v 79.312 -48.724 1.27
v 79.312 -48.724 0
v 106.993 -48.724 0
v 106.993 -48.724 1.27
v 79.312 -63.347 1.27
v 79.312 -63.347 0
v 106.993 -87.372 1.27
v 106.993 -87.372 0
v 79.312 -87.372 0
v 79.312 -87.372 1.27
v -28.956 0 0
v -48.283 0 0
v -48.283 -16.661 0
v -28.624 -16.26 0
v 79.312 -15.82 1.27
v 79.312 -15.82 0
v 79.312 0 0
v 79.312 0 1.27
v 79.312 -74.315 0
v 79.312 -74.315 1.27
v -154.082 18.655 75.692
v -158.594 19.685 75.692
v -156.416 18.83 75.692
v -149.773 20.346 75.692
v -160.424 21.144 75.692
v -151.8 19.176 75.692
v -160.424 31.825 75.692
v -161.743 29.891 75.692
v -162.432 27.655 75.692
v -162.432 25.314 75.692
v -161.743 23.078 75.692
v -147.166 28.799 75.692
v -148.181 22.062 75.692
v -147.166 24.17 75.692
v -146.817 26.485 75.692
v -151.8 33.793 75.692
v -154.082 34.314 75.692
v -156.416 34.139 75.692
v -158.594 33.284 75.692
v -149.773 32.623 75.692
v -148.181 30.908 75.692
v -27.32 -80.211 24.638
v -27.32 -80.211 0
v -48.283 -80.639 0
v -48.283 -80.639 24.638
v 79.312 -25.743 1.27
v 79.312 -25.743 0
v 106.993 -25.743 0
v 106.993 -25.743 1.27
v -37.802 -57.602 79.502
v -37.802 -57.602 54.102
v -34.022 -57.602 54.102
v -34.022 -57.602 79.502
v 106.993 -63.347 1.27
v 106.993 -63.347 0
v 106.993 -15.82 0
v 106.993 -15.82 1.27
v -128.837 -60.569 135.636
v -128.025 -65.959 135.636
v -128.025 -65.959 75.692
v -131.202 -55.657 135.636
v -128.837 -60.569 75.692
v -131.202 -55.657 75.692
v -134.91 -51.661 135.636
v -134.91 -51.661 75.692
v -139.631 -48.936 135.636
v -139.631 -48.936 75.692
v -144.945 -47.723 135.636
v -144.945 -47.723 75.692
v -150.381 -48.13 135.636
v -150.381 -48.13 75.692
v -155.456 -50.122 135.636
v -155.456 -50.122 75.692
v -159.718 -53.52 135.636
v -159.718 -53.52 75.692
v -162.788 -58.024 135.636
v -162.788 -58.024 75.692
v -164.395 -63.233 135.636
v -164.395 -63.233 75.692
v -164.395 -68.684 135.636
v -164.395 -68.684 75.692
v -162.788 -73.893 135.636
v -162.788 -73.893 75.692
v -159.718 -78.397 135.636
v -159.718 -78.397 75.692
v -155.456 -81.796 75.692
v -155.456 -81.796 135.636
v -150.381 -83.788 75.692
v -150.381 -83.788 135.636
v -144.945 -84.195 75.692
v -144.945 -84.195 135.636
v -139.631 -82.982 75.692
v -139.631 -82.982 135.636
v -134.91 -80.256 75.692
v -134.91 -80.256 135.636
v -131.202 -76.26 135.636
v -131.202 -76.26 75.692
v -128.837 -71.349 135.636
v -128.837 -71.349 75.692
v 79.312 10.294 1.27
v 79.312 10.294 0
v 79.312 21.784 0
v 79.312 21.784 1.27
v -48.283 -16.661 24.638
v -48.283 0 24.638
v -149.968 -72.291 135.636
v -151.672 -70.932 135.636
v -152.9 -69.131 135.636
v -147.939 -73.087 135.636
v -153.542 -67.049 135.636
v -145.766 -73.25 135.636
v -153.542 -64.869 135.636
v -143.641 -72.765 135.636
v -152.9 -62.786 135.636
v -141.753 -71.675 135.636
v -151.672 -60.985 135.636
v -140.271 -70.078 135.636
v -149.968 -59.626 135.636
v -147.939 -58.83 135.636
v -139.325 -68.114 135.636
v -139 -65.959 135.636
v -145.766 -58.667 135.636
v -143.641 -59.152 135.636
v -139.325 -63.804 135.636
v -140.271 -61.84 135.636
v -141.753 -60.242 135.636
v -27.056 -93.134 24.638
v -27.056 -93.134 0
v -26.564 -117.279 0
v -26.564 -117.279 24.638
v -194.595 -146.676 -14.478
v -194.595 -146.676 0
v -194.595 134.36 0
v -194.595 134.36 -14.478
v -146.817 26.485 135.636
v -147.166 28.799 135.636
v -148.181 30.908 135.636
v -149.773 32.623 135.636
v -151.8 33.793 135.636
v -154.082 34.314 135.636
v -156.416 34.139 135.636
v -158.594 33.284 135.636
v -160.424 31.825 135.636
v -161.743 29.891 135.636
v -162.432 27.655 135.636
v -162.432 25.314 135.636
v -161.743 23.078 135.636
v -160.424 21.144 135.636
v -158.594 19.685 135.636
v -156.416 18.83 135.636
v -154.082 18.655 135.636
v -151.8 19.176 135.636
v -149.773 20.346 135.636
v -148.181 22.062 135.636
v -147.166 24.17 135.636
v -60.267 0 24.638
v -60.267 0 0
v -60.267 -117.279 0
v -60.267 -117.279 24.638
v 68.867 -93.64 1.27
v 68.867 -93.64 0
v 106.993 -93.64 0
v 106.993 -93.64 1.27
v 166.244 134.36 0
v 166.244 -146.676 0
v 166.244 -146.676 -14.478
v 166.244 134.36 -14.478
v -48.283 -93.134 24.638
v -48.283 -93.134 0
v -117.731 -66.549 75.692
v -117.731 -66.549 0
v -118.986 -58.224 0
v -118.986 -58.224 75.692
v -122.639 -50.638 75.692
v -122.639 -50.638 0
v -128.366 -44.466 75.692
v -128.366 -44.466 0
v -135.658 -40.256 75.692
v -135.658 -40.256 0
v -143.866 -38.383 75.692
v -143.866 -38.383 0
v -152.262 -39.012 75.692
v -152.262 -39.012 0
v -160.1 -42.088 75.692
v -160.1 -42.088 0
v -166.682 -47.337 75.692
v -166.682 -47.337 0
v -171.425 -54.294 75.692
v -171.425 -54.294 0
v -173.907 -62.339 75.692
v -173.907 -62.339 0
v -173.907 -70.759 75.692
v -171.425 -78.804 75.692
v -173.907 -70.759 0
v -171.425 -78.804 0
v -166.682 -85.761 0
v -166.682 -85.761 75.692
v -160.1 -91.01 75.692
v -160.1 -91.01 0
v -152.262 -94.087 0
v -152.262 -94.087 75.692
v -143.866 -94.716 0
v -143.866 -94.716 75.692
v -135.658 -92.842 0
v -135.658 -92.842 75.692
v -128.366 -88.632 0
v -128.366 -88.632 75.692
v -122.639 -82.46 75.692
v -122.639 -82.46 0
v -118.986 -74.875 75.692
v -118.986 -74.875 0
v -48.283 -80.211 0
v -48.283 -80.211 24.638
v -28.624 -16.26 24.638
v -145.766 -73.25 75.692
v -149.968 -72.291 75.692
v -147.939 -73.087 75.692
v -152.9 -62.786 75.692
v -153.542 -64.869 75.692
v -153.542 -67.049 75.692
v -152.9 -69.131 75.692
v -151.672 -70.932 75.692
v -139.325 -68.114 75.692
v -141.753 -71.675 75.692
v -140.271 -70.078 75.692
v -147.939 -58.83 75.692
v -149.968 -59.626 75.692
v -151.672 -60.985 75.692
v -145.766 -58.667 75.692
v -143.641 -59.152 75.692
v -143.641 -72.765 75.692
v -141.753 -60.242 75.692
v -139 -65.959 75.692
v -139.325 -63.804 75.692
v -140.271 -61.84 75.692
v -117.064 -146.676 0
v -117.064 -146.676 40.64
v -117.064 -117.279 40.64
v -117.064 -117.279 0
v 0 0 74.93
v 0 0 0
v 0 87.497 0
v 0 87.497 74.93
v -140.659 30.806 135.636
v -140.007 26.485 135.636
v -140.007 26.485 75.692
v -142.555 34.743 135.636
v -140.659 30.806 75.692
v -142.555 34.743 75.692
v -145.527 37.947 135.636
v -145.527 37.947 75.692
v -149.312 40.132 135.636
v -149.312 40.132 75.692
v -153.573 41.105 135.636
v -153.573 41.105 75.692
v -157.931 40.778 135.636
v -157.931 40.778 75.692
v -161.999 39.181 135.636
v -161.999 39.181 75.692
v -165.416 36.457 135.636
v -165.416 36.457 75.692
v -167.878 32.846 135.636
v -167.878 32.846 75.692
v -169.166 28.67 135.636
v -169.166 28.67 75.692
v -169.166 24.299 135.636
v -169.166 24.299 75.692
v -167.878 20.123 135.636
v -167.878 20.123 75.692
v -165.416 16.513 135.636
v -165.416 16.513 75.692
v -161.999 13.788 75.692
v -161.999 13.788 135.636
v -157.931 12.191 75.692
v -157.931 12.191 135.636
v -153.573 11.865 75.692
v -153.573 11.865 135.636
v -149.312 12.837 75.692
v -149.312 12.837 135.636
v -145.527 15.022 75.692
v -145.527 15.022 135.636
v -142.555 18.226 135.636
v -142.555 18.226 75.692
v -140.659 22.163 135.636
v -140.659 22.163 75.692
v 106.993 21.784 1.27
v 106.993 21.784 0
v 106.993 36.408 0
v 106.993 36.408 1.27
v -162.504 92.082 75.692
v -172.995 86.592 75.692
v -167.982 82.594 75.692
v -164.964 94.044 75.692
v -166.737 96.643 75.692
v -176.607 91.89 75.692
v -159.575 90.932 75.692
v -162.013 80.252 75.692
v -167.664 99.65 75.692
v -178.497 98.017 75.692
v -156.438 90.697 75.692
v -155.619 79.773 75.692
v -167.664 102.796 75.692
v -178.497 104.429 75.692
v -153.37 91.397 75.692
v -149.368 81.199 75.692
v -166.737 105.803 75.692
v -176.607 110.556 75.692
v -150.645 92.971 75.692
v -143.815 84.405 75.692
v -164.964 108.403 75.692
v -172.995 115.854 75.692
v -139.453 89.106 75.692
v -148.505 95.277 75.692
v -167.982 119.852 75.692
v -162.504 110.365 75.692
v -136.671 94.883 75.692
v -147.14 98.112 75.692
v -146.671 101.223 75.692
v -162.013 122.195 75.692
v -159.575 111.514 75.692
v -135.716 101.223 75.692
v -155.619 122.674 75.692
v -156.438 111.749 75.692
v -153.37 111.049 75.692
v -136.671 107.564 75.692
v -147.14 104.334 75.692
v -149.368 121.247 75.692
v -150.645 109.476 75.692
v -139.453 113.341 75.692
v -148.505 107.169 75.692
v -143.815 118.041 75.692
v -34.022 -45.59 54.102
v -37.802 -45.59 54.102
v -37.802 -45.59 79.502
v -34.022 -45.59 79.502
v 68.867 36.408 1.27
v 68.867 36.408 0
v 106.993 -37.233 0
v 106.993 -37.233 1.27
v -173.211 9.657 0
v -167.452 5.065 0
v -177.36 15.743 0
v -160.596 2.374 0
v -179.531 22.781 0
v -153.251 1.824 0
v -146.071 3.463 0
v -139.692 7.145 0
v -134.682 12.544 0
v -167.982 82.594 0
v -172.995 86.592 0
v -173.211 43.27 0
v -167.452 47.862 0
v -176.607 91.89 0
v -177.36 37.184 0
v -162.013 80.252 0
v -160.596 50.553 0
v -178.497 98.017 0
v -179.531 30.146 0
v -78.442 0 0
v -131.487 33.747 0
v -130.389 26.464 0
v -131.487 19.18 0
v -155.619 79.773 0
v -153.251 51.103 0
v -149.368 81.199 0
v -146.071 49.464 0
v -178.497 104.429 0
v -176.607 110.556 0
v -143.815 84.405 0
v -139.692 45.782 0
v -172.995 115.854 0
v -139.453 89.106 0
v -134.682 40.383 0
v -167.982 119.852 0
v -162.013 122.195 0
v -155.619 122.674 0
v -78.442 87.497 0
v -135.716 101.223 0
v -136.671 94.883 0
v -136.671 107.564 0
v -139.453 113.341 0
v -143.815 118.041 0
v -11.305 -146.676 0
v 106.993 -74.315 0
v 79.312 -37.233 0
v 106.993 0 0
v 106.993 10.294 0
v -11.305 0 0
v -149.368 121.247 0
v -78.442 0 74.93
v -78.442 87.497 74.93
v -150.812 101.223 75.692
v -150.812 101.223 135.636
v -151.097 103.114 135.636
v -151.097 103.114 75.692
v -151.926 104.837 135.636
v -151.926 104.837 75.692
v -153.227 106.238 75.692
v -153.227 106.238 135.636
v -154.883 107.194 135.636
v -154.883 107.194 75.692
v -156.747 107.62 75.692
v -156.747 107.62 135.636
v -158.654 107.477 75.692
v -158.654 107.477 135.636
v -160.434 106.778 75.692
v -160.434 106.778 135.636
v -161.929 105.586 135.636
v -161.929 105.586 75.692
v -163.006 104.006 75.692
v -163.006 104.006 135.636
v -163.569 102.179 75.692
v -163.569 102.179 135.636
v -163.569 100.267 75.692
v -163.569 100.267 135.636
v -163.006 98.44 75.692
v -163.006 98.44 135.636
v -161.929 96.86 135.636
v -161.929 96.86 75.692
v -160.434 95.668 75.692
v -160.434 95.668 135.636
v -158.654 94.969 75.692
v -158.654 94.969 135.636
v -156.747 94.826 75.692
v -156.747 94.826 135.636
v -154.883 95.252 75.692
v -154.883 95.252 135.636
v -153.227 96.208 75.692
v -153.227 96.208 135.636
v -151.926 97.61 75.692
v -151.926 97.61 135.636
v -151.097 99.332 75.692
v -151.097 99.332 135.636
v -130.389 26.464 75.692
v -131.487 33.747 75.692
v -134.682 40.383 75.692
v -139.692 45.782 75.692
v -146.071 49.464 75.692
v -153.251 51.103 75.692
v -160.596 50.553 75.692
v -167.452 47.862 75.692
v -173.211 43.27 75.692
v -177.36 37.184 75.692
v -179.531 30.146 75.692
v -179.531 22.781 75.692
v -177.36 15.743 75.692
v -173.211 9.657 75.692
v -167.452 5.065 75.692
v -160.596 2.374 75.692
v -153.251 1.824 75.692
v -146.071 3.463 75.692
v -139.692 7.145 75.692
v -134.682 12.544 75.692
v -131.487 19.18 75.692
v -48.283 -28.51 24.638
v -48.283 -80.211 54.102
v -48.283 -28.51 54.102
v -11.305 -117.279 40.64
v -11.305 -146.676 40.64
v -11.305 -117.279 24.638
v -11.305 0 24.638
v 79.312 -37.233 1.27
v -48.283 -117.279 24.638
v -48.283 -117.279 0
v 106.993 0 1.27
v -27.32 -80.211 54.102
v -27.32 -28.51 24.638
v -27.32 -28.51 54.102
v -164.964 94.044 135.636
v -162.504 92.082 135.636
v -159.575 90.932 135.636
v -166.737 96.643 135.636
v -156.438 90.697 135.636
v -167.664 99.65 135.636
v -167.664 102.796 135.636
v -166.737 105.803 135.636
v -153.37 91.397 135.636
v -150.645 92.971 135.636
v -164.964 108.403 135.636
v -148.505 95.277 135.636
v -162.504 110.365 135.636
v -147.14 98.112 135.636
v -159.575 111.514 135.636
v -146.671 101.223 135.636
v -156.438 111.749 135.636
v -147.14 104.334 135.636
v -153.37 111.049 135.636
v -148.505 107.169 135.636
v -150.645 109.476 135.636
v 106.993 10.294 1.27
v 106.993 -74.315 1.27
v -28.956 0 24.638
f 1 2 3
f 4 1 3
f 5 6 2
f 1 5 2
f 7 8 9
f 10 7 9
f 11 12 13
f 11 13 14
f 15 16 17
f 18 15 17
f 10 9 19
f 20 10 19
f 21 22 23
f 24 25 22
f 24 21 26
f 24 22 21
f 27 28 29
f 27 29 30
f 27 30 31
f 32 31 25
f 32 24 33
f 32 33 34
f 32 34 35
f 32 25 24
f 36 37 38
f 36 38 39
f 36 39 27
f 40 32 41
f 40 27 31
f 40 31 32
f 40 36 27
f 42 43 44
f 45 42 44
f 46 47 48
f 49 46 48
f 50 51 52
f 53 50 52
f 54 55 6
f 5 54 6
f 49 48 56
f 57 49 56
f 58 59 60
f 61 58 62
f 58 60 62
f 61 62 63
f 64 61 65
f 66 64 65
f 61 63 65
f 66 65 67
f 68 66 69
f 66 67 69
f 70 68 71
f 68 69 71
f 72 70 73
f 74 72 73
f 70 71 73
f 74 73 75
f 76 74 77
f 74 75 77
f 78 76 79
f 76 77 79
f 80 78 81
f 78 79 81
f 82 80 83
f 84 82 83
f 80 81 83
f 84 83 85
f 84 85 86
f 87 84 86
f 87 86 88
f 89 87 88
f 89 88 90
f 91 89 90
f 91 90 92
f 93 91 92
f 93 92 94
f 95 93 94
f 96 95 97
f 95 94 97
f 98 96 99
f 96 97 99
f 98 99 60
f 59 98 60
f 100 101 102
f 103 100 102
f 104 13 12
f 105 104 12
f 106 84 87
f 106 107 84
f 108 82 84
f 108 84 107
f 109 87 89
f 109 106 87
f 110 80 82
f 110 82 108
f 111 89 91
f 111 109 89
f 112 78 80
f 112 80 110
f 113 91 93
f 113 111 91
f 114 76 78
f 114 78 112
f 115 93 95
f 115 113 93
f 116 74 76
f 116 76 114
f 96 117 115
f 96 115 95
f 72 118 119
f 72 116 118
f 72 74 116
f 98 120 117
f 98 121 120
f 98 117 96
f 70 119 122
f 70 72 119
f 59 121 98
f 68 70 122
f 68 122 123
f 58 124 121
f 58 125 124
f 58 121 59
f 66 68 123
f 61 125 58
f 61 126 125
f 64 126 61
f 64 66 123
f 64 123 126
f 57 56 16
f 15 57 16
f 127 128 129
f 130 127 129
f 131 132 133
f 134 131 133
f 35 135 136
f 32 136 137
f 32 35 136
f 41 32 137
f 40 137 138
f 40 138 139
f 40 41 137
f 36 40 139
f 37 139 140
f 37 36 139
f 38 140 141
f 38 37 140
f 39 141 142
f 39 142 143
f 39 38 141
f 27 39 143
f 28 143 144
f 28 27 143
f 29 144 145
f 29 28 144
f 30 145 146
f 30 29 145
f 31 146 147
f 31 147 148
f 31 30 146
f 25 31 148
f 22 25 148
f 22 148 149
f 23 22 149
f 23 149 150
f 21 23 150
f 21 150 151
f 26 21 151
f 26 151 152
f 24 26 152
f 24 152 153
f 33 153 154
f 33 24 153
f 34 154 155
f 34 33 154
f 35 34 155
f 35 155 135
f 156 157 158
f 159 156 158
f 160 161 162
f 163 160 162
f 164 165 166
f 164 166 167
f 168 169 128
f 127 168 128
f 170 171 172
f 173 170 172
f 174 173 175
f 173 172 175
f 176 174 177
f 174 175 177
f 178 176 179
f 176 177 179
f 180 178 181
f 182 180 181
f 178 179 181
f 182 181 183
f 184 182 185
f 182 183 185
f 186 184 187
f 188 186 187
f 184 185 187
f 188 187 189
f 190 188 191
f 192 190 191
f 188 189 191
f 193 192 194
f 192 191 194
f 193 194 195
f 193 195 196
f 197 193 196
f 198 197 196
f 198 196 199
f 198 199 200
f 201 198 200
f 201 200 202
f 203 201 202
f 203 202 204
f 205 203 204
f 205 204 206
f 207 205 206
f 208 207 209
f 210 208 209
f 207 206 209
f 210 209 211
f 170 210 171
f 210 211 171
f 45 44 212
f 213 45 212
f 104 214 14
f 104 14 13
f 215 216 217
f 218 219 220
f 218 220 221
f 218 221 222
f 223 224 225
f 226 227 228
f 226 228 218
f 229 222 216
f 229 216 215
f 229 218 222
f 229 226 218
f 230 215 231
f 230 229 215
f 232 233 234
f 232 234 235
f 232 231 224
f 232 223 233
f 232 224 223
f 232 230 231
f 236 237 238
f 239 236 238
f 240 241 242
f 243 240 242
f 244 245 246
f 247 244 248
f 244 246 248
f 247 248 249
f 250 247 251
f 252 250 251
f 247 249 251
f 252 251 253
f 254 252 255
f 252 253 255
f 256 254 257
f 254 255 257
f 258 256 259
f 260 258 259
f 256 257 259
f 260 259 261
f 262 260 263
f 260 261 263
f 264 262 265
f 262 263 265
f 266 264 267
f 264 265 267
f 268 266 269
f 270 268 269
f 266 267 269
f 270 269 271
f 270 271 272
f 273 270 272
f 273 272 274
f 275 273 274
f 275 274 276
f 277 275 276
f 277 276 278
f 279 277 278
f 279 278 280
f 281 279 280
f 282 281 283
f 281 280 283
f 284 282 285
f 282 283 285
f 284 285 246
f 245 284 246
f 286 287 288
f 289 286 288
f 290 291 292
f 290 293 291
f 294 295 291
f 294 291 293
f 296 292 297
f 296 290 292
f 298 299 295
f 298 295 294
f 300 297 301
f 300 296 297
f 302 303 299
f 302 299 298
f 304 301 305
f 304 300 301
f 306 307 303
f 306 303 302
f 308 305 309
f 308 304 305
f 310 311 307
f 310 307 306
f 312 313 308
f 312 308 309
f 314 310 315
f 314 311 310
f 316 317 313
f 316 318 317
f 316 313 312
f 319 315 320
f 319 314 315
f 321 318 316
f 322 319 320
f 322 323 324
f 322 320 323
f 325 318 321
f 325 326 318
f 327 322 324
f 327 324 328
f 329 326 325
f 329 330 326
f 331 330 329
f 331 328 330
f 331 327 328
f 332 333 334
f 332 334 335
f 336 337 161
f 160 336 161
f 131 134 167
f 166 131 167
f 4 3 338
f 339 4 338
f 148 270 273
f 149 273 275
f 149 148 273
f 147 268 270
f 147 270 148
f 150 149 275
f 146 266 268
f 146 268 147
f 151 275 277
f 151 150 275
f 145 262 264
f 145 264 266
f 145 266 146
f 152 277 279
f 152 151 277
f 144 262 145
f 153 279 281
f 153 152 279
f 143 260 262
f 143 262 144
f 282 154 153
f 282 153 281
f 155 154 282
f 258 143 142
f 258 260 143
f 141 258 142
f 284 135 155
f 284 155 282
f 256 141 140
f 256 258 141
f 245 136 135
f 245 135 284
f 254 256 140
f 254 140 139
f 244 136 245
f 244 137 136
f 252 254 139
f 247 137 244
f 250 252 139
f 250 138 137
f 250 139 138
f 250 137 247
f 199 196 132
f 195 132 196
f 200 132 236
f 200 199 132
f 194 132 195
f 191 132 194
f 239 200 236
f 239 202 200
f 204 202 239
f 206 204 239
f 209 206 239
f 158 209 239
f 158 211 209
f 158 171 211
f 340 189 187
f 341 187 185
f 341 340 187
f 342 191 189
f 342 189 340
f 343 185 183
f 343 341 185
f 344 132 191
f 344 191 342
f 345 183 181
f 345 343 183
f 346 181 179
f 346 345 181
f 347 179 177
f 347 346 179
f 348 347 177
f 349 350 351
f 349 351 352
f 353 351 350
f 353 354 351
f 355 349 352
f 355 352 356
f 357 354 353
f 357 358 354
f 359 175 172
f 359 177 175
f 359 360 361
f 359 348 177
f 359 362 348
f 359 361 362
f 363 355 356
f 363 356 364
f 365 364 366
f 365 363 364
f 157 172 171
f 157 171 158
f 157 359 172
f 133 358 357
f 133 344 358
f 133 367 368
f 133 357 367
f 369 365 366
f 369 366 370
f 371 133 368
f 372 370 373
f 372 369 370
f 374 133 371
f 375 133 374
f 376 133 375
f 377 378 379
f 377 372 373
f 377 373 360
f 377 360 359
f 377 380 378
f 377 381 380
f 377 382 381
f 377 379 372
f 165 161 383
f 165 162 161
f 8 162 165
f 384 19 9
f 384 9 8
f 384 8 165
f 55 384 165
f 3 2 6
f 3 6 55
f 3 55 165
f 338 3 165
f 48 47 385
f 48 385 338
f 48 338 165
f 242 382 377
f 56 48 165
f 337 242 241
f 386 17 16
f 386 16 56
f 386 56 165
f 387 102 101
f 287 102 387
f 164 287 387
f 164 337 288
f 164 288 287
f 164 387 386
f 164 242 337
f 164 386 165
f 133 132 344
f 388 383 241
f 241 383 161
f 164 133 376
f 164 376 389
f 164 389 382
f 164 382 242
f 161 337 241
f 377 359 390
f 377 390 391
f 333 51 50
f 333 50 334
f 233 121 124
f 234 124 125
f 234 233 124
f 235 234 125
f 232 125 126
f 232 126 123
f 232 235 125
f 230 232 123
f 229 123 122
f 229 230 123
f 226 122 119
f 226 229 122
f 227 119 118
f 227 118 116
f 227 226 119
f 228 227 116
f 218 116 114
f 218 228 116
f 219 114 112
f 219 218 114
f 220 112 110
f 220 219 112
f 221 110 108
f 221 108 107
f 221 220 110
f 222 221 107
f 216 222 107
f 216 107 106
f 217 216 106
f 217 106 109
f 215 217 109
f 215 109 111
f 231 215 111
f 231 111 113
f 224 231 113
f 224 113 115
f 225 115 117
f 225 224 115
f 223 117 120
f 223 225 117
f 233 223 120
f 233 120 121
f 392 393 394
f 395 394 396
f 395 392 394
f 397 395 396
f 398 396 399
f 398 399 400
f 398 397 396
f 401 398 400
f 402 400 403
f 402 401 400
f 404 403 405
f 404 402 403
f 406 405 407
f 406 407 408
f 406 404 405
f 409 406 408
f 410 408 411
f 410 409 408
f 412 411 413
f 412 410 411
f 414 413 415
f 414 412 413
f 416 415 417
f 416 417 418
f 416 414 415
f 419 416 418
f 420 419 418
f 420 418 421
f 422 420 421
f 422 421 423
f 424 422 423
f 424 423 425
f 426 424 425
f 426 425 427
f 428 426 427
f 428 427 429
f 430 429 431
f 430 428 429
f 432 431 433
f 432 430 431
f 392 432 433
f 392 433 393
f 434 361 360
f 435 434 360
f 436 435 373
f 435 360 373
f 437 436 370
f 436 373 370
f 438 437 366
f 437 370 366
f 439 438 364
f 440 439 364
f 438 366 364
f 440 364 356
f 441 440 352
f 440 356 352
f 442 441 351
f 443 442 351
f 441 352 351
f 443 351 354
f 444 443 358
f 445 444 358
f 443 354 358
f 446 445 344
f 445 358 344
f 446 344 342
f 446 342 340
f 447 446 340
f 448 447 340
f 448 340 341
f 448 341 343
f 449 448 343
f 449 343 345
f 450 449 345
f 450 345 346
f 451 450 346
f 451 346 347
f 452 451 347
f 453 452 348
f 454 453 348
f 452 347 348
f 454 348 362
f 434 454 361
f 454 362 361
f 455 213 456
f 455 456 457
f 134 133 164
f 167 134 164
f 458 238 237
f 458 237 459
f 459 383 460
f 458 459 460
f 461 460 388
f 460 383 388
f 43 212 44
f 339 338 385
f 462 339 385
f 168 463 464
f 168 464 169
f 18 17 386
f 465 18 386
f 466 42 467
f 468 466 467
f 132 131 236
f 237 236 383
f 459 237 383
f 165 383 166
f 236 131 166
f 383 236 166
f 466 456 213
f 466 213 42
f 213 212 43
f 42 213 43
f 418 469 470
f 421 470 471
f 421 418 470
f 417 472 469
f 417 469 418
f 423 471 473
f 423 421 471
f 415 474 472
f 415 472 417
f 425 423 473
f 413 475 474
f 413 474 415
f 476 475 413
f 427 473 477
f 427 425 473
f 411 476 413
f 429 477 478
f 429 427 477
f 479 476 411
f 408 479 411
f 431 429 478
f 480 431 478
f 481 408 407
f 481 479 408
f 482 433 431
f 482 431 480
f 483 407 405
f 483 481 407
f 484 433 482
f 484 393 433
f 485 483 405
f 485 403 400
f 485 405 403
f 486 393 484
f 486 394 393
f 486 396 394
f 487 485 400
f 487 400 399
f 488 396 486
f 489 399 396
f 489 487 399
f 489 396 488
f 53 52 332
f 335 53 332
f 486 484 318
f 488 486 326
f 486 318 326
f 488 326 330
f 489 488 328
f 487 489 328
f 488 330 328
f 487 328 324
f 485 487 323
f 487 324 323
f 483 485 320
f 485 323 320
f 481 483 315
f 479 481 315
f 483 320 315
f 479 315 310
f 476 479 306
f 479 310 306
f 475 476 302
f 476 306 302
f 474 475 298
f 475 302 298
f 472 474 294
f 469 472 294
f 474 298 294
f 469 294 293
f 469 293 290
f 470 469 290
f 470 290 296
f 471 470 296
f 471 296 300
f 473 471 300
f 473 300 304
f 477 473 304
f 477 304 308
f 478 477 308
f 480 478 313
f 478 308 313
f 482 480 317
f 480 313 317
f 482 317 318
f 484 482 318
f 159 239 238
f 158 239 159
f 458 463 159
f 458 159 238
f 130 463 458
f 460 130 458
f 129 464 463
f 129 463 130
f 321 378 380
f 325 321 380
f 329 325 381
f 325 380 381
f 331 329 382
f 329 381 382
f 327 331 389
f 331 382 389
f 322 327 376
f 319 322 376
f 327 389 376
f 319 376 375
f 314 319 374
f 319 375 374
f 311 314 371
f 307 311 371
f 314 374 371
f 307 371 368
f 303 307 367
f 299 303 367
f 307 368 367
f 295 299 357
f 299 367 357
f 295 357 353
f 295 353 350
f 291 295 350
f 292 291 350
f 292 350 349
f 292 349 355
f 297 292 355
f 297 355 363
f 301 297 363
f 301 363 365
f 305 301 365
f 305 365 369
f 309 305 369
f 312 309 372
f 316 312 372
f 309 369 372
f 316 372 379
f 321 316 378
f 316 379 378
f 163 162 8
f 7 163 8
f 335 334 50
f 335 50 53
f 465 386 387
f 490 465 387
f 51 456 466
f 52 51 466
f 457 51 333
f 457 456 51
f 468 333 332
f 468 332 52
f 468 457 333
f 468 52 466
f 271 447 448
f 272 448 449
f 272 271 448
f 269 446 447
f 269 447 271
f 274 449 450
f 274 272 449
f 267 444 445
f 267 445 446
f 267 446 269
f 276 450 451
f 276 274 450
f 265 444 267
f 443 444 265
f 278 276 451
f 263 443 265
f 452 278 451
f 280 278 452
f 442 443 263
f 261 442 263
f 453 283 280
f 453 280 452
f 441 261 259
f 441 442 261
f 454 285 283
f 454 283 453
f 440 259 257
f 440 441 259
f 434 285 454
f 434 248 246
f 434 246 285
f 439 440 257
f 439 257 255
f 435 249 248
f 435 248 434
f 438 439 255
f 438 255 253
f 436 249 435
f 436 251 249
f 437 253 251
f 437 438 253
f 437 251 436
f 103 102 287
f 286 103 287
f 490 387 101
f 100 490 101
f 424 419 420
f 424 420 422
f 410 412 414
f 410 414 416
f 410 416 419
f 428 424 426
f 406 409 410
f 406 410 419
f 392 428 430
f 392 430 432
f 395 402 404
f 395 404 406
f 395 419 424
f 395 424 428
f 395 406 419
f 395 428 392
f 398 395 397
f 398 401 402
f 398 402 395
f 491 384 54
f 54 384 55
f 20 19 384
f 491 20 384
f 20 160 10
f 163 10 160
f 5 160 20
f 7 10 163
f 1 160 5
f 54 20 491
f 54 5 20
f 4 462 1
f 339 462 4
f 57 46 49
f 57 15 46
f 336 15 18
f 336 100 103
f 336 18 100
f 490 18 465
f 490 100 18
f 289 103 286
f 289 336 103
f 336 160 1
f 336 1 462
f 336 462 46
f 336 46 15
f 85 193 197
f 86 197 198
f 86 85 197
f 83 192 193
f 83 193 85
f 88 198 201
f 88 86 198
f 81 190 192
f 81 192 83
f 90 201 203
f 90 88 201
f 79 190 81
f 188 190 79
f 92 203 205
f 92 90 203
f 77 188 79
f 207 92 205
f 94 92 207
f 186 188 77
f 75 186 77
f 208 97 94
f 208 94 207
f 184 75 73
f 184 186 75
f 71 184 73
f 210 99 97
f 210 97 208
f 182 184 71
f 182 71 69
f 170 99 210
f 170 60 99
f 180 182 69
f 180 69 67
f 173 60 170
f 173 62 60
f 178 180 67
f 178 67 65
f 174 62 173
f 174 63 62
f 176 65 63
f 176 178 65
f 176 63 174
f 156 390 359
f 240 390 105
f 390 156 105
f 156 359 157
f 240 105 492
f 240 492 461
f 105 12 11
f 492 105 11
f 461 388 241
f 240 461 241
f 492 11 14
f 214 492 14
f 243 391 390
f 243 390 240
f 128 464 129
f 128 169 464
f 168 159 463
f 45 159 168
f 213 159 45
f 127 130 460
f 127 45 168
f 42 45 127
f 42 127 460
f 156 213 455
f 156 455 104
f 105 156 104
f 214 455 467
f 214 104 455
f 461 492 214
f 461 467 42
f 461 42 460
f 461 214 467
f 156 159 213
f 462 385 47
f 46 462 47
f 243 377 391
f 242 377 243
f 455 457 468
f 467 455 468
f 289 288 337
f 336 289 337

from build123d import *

# Parameters (mm, degrees)
F0_W      = 360.8396798372
F0_H      = 281.035810709
F1_DEPTH  = 14.478
F2_R      = 21.5107094722
F2_R_2    = 24.7089721203
F2_R_3    = 28.2455541112
F3_DEPTH  = 75.692
F4_R      = 10.5555341184
F4_R_2    = 6.4147085914
F4_R_3    = 14.6610687467
F4_R_4    = 7.8515753599
F4_R_5    = 18.2872208754
F4_R_6    = 7.3119029403
F5_DEPTH  = 59.944
F6_W      = 78.4418359399
F6_H      = 87.4972045422
F7_DEPTH  = 74.93
F9_DEPTH  = 24.638
F10_W     = 20.9634182729
F10_H     = 51.7013933032
F11_DEPTH = 54.102
F12_W     = 3.7795142394
F12_H     = 12.0124146342
F13_DEPTH = 25.4
F14_W     = 105.7597789913
F14_H     = 29.3969660997
F15_DEPTH = 40.64
F17_DEPTH = 1.27


with BuildPart() as f1:
    # F0 (on Top) → F1 (new body)
    with BuildSketch(Plane.XY):
        with Locations((-14.175452292, -6.1578452587)):
            Rectangle(F0_W, F0_H)
    extrude(amount=-F1_DEPTH)

    # F2 (on face) → F3 (join)
    with BuildSketch(Plane.XY):
        with Locations((-157.2264283895, 101.2231707573)):
            Circle(F2_R)
        with Locations((-155.097797513, 26.4635402709)):
            Circle(F2_R_2)
        with Locations((-145.9769010544, -66.5491223335)):
            Circle(F2_R_3)
    extrude(amount=F3_DEPTH)

    # F4 (on face) → F5 (join)
    with BuildSketch(Plane.XY.offset(75.692)):
        with Locations((-157.2264283895, 101.2231707573)):
            Circle(F4_R)
        with Locations((-157.2264283895, 101.2231707573)):
            Circle(F4_R_2, mode=Mode.SUBTRACT)
        with Locations((-154.6684801579, 26.4845881611)):
            Circle(F4_R_3)
        with Locations((-154.6684801579, 26.4845881611)):
            Circle(F4_R_4, mode=Mode.SUBTRACT)
        with Locations((-146.3120281696, -65.9587830305)):
            Circle(F4_R_5)
        with Locations((-146.3120281696, -65.9587830305)):
            Circle(F4_R_6, mode=Mode.SUBTRACT)
    extrude(amount=F5_DEPTH)

    # F6 (on face) → F7 (join)
    with BuildSketch(Plane.XY):
        with Locations((-39.2209179699, 43.7486022711)):
            Rectangle(F6_W, F6_H)
    extrude(amount=F7_DEPTH)

    # F8 (on face) → F9 (join)
    with BuildSketch(Plane.XY):
        Polygon((-48.2832752168, 0), (-60.267470777, 0), (-60.267470777, -66.7334496975), (-60.267470777, -117.2787845135), (-48.2832752168, -117.2787845135), (-48.2832752168, -93.1336581707), (-48.2832752168, -80.6389690893), (-48.2832752168, -58.6393922567), (-48.2832752168, -43.9444051084), (-48.2832752168, -28.5100445064), (-48.2832752168, -16.6609026492), align=None)
        Polygon((-28.6240933259, -16.2599701732), (-48.2832752168, -16.6609026492), (-48.2832752168, -28.5100445064), (-28.3742633655, -28.5100445064), align=None)
        Polygon((-27.3198569439, -16.2333713694), (-28.6240933259, -16.2599701732), (-28.3742633655, -28.5100445064), align=None)
        Polygon((-28.9557017386, 0), (-28.6240933259, -16.2599701732), (-27.3198569439, -16.2333713694), (-28.3742633655, -28.5100445064), (-28.0799994067, -42.9388798786), (-27.3198569439, -58.211860977), (-27.7683332748, -58.2210072744), (-27.3198569439, -80.2114378095), (-26.5638995916, -93.1336581707), (-27.0563191308, -93.1336581707), (-26.5638995916, -117.2787845135), (-11.304622516, -117.2787845135), (-11.304622516, 0), align=None)
        Polygon((-48.2832752168, -80.6389690893), (-48.2832752168, -93.1336581707), (-27.0563191308, -93.1336581707), (-27.3198569439, -80.2114378095), align=None)
        Polygon((-27.3198569439, -80.2114378095), (-27.0563191308, -93.1336581707), (-26.5638995916, -93.1336581707), align=None)
    extrude(amount=F9_DEPTH)

    # F10 (on face) → F11 (join)
    with BuildSketch(Plane.XY):
        with Locations((-37.8015660804, -54.360741158)):
            Rectangle(F10_W, F10_H)
    extrude(amount=F11_DEPTH)

    # F12 (on face) → F13 (join)
    with BuildSketch(Plane.XY.offset(54.102)):
        with Locations((-35.9118089607, -51.5961125493)):
            Rectangle(F12_W, F12_H)
    extrude(amount=F13_DEPTH)

    # F14 (on face) → F15 (join)
    with BuildSketch(Plane.XY):
        with Locations((-64.1845120117, -131.9772675633)):
            Rectangle(F14_W, F14_H)
    extrude(amount=F15_DEPTH)

    # F16 (on face) → F17 (join)
    with BuildSketch(Plane.XY):
        Polygon((106.9932729006, 36.4078879356), (68.8668936491, 36.4078879356), (68.8668936491, -93.6395674944), (106.9932729006, -93.6395674944), (106.9932729006, -87.3722210526), (79.3124735355, -87.3722210526), (79.3124735355, -74.3152499199), (106.9932729006, -74.3152499199), (106.9932729006, -63.3473917842), (79.3124735355, -63.3473917842), (79.3124735355, -48.7235784531), (106.9932729006, -48.7235784531), (106.9932729006, -37.2334420681), (79.3124735355, -37.2334420681), (79.3124735355, -25.7433056831), (106.9932729006, -25.7433056831), (106.9932729006, -15.8200059086), (79.3124735355, -15.8200059086), (79.3124735355, 0), (106.9932729006, 0), (106.9932729006, 10.2939419448), (79.3124735355, 10.2939419448), (79.3124735355, 21.7840764672), (106.9932729006, 21.7840764672), align=None)
    extrude(amount=F17_DEPTH)


solid = f1.part
